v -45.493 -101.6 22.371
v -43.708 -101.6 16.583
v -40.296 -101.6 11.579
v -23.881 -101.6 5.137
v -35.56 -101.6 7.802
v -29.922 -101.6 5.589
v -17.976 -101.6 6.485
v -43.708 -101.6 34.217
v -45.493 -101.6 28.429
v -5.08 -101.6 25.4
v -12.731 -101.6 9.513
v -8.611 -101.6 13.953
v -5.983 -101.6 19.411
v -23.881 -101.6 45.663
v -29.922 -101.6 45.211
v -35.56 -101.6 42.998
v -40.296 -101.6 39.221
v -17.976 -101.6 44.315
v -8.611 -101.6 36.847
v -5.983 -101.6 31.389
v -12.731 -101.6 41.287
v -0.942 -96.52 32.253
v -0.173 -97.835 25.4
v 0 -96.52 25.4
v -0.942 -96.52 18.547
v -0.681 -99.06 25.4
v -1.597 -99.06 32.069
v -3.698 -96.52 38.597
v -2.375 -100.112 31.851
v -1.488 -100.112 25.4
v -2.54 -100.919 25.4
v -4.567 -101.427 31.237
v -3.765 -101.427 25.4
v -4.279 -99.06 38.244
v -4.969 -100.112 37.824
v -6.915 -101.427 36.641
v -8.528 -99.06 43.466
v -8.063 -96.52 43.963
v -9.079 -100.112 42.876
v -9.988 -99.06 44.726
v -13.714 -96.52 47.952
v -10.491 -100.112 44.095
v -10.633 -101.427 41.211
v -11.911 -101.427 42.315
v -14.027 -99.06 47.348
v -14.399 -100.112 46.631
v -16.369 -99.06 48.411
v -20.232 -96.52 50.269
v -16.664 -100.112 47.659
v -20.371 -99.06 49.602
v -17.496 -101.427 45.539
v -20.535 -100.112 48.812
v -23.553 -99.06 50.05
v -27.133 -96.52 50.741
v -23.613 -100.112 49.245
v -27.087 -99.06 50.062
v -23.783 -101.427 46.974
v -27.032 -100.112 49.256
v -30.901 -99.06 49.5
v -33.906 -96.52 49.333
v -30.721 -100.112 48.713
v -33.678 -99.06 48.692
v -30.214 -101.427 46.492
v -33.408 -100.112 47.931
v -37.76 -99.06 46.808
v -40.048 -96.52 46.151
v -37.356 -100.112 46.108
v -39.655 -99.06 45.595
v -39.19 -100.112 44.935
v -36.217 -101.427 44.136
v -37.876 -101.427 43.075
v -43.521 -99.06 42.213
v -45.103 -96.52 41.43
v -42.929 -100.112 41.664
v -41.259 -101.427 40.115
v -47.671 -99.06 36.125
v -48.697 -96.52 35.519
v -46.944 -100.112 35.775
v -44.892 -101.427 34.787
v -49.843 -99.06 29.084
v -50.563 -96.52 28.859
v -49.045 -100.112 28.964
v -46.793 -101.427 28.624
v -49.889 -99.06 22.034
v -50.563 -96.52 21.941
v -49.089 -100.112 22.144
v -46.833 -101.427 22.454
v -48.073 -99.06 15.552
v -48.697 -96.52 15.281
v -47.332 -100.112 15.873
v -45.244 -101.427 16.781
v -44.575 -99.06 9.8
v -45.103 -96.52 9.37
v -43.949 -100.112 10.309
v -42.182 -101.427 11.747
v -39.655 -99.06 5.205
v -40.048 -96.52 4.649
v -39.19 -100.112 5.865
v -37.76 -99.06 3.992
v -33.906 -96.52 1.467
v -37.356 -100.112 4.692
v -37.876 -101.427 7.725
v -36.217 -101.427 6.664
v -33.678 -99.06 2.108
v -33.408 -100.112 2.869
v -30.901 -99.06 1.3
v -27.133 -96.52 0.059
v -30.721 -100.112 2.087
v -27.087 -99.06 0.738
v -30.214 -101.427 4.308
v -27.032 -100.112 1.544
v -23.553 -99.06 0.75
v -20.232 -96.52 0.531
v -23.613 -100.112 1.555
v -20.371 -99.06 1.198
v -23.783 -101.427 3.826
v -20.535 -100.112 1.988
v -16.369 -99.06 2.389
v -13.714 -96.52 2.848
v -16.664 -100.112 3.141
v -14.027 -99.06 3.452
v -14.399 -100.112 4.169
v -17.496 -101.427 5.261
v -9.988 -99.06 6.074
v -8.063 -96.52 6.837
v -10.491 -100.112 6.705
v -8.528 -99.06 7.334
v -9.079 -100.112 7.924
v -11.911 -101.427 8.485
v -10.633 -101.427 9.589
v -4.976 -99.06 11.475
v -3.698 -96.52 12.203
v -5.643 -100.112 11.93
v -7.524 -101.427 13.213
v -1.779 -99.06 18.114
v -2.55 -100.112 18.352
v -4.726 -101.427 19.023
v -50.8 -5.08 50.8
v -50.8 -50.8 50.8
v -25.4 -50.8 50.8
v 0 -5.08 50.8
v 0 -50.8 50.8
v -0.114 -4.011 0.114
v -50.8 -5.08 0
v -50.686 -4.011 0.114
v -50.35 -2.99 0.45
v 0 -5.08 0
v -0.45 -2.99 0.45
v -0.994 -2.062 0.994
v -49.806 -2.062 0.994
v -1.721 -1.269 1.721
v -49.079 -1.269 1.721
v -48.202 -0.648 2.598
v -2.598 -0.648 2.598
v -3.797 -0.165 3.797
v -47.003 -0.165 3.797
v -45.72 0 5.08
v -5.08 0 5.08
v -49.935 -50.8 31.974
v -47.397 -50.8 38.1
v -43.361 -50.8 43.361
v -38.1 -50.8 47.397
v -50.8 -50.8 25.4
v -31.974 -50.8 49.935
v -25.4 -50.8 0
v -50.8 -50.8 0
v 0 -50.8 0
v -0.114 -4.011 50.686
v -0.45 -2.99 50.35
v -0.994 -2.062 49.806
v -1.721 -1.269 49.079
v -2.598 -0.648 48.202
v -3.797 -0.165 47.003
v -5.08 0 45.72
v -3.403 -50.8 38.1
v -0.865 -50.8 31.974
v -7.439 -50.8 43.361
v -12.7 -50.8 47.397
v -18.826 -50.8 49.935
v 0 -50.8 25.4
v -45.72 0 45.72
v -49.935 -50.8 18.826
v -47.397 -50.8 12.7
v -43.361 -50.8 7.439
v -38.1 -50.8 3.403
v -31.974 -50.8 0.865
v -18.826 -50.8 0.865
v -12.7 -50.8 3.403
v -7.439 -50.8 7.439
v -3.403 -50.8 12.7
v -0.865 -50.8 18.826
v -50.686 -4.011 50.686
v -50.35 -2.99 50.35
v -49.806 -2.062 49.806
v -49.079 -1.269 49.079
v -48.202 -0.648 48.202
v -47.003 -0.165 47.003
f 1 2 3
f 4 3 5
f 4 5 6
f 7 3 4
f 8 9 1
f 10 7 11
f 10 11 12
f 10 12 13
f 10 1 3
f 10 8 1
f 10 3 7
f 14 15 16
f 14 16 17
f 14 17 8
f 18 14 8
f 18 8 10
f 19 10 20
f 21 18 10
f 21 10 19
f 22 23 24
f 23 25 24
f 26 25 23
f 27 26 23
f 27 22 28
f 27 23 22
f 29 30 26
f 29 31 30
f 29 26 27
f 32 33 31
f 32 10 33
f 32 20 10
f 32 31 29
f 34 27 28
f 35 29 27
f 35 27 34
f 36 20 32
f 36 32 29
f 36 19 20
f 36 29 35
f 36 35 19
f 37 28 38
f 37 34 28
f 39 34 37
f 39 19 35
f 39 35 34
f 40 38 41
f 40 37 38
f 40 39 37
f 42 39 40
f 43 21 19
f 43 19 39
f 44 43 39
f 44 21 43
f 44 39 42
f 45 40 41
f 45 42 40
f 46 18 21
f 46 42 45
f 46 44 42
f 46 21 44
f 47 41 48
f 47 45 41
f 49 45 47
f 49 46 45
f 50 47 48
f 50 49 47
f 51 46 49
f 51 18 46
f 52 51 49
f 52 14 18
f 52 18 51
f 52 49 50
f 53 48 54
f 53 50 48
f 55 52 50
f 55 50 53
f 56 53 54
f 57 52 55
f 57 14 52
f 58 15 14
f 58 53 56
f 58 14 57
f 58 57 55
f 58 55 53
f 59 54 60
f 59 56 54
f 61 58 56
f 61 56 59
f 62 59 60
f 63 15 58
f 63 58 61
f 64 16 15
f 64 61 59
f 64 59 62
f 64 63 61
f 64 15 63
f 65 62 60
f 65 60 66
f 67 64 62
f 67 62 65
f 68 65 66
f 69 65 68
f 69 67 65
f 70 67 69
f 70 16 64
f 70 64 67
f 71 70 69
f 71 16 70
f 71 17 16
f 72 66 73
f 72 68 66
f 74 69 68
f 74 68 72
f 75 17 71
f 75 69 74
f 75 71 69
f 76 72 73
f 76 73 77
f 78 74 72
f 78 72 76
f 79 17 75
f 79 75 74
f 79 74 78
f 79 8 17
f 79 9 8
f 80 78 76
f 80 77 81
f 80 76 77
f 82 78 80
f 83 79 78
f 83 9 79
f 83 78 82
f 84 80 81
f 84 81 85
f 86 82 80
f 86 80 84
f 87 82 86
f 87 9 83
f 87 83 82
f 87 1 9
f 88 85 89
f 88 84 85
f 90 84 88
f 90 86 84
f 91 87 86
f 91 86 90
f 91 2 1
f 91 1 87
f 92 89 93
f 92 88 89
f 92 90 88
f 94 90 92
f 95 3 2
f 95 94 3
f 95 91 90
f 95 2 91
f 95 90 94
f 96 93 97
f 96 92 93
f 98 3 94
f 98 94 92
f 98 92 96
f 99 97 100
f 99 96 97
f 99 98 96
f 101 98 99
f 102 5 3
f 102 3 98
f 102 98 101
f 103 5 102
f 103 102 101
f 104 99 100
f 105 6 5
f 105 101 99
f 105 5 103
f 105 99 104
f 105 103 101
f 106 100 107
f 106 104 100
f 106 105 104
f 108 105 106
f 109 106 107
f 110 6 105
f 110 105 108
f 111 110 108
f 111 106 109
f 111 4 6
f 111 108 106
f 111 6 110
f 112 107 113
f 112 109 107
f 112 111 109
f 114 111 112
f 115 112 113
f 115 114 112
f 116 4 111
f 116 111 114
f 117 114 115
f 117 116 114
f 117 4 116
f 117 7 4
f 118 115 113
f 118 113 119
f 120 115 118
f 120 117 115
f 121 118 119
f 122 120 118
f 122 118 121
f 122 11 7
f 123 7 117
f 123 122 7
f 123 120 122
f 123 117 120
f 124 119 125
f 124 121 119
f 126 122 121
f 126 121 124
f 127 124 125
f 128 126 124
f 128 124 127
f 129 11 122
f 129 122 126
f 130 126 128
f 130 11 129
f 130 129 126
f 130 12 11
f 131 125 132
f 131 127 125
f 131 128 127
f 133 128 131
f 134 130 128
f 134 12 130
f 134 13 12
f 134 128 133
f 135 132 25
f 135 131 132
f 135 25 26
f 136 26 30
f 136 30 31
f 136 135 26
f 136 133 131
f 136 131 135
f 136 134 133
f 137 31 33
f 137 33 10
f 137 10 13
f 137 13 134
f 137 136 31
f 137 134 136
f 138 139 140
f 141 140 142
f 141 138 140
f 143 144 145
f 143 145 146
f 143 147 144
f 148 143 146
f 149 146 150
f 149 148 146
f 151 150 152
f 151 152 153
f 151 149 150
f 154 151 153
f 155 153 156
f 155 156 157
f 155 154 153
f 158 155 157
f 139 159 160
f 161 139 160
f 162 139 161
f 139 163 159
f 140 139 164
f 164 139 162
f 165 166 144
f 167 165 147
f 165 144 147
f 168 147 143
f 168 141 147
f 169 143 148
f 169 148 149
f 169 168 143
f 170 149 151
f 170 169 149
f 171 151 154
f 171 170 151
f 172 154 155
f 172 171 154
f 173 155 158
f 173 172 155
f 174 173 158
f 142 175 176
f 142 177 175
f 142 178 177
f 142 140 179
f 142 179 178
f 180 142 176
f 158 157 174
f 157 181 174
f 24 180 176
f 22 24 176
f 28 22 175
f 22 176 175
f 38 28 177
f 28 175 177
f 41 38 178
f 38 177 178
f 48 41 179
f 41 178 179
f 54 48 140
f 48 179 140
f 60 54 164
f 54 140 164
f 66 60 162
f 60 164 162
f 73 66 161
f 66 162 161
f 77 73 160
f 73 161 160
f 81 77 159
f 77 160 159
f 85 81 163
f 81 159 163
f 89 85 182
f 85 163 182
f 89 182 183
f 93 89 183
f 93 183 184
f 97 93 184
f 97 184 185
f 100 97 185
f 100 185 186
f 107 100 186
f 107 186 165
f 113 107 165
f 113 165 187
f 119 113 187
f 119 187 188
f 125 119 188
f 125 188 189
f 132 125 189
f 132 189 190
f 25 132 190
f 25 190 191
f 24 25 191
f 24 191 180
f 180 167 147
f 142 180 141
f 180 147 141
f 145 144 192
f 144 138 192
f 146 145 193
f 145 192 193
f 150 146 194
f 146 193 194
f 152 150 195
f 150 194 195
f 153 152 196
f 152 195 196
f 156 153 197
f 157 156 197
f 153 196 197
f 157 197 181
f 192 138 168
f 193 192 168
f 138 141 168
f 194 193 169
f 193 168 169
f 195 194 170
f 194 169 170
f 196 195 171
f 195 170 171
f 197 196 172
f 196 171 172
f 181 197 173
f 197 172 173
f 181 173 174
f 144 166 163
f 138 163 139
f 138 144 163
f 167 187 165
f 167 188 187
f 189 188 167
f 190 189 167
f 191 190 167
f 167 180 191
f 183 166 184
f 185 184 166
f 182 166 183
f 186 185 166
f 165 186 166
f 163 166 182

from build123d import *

# Parameters (mm, degrees)
F0_W     = 50.8
F0_H     = 50.8
F1_DEPTH = 50.8
F2_R     = 25.4
F3_DEPTH = 50.8
F4_R     = 5.08
F5_R     = 5.08


with BuildPart() as f1:
    # F0 (on Front) → F1 (new body)
    with BuildSketch(Plane.XZ):
        with Locations((-25.4, 25.4)):
            Rectangle(F0_W, F0_H)
    extrude(amount=F1_DEPTH)

    # F2 (on face) → F3 (join)
    with BuildSketch(Plane.XZ.offset(50.8)):
        with Locations((-25.4, 25.4)):
            Circle(F2_R)
    extrude(amount=F3_DEPTH)

    # F4
    f4_edges = [f1.edges().sort_by_distance(p)[0] for p in [
        (-25.4, 0, 0),
        (0, 0, 25.4),
        (-25.4, 0, 50.8),
        (-50.8, 0, 25.4),
    ]]
    fillet(f4_edges, radius=F4_R)

    # F5
    f5_edges = [f1.edges().sort_by_distance(p)[0] for p in [
        (-50.8, -101.6, 25.4),
    ]]
    fillet(f5_edges, radius=F5_R)


solid = f1.part
